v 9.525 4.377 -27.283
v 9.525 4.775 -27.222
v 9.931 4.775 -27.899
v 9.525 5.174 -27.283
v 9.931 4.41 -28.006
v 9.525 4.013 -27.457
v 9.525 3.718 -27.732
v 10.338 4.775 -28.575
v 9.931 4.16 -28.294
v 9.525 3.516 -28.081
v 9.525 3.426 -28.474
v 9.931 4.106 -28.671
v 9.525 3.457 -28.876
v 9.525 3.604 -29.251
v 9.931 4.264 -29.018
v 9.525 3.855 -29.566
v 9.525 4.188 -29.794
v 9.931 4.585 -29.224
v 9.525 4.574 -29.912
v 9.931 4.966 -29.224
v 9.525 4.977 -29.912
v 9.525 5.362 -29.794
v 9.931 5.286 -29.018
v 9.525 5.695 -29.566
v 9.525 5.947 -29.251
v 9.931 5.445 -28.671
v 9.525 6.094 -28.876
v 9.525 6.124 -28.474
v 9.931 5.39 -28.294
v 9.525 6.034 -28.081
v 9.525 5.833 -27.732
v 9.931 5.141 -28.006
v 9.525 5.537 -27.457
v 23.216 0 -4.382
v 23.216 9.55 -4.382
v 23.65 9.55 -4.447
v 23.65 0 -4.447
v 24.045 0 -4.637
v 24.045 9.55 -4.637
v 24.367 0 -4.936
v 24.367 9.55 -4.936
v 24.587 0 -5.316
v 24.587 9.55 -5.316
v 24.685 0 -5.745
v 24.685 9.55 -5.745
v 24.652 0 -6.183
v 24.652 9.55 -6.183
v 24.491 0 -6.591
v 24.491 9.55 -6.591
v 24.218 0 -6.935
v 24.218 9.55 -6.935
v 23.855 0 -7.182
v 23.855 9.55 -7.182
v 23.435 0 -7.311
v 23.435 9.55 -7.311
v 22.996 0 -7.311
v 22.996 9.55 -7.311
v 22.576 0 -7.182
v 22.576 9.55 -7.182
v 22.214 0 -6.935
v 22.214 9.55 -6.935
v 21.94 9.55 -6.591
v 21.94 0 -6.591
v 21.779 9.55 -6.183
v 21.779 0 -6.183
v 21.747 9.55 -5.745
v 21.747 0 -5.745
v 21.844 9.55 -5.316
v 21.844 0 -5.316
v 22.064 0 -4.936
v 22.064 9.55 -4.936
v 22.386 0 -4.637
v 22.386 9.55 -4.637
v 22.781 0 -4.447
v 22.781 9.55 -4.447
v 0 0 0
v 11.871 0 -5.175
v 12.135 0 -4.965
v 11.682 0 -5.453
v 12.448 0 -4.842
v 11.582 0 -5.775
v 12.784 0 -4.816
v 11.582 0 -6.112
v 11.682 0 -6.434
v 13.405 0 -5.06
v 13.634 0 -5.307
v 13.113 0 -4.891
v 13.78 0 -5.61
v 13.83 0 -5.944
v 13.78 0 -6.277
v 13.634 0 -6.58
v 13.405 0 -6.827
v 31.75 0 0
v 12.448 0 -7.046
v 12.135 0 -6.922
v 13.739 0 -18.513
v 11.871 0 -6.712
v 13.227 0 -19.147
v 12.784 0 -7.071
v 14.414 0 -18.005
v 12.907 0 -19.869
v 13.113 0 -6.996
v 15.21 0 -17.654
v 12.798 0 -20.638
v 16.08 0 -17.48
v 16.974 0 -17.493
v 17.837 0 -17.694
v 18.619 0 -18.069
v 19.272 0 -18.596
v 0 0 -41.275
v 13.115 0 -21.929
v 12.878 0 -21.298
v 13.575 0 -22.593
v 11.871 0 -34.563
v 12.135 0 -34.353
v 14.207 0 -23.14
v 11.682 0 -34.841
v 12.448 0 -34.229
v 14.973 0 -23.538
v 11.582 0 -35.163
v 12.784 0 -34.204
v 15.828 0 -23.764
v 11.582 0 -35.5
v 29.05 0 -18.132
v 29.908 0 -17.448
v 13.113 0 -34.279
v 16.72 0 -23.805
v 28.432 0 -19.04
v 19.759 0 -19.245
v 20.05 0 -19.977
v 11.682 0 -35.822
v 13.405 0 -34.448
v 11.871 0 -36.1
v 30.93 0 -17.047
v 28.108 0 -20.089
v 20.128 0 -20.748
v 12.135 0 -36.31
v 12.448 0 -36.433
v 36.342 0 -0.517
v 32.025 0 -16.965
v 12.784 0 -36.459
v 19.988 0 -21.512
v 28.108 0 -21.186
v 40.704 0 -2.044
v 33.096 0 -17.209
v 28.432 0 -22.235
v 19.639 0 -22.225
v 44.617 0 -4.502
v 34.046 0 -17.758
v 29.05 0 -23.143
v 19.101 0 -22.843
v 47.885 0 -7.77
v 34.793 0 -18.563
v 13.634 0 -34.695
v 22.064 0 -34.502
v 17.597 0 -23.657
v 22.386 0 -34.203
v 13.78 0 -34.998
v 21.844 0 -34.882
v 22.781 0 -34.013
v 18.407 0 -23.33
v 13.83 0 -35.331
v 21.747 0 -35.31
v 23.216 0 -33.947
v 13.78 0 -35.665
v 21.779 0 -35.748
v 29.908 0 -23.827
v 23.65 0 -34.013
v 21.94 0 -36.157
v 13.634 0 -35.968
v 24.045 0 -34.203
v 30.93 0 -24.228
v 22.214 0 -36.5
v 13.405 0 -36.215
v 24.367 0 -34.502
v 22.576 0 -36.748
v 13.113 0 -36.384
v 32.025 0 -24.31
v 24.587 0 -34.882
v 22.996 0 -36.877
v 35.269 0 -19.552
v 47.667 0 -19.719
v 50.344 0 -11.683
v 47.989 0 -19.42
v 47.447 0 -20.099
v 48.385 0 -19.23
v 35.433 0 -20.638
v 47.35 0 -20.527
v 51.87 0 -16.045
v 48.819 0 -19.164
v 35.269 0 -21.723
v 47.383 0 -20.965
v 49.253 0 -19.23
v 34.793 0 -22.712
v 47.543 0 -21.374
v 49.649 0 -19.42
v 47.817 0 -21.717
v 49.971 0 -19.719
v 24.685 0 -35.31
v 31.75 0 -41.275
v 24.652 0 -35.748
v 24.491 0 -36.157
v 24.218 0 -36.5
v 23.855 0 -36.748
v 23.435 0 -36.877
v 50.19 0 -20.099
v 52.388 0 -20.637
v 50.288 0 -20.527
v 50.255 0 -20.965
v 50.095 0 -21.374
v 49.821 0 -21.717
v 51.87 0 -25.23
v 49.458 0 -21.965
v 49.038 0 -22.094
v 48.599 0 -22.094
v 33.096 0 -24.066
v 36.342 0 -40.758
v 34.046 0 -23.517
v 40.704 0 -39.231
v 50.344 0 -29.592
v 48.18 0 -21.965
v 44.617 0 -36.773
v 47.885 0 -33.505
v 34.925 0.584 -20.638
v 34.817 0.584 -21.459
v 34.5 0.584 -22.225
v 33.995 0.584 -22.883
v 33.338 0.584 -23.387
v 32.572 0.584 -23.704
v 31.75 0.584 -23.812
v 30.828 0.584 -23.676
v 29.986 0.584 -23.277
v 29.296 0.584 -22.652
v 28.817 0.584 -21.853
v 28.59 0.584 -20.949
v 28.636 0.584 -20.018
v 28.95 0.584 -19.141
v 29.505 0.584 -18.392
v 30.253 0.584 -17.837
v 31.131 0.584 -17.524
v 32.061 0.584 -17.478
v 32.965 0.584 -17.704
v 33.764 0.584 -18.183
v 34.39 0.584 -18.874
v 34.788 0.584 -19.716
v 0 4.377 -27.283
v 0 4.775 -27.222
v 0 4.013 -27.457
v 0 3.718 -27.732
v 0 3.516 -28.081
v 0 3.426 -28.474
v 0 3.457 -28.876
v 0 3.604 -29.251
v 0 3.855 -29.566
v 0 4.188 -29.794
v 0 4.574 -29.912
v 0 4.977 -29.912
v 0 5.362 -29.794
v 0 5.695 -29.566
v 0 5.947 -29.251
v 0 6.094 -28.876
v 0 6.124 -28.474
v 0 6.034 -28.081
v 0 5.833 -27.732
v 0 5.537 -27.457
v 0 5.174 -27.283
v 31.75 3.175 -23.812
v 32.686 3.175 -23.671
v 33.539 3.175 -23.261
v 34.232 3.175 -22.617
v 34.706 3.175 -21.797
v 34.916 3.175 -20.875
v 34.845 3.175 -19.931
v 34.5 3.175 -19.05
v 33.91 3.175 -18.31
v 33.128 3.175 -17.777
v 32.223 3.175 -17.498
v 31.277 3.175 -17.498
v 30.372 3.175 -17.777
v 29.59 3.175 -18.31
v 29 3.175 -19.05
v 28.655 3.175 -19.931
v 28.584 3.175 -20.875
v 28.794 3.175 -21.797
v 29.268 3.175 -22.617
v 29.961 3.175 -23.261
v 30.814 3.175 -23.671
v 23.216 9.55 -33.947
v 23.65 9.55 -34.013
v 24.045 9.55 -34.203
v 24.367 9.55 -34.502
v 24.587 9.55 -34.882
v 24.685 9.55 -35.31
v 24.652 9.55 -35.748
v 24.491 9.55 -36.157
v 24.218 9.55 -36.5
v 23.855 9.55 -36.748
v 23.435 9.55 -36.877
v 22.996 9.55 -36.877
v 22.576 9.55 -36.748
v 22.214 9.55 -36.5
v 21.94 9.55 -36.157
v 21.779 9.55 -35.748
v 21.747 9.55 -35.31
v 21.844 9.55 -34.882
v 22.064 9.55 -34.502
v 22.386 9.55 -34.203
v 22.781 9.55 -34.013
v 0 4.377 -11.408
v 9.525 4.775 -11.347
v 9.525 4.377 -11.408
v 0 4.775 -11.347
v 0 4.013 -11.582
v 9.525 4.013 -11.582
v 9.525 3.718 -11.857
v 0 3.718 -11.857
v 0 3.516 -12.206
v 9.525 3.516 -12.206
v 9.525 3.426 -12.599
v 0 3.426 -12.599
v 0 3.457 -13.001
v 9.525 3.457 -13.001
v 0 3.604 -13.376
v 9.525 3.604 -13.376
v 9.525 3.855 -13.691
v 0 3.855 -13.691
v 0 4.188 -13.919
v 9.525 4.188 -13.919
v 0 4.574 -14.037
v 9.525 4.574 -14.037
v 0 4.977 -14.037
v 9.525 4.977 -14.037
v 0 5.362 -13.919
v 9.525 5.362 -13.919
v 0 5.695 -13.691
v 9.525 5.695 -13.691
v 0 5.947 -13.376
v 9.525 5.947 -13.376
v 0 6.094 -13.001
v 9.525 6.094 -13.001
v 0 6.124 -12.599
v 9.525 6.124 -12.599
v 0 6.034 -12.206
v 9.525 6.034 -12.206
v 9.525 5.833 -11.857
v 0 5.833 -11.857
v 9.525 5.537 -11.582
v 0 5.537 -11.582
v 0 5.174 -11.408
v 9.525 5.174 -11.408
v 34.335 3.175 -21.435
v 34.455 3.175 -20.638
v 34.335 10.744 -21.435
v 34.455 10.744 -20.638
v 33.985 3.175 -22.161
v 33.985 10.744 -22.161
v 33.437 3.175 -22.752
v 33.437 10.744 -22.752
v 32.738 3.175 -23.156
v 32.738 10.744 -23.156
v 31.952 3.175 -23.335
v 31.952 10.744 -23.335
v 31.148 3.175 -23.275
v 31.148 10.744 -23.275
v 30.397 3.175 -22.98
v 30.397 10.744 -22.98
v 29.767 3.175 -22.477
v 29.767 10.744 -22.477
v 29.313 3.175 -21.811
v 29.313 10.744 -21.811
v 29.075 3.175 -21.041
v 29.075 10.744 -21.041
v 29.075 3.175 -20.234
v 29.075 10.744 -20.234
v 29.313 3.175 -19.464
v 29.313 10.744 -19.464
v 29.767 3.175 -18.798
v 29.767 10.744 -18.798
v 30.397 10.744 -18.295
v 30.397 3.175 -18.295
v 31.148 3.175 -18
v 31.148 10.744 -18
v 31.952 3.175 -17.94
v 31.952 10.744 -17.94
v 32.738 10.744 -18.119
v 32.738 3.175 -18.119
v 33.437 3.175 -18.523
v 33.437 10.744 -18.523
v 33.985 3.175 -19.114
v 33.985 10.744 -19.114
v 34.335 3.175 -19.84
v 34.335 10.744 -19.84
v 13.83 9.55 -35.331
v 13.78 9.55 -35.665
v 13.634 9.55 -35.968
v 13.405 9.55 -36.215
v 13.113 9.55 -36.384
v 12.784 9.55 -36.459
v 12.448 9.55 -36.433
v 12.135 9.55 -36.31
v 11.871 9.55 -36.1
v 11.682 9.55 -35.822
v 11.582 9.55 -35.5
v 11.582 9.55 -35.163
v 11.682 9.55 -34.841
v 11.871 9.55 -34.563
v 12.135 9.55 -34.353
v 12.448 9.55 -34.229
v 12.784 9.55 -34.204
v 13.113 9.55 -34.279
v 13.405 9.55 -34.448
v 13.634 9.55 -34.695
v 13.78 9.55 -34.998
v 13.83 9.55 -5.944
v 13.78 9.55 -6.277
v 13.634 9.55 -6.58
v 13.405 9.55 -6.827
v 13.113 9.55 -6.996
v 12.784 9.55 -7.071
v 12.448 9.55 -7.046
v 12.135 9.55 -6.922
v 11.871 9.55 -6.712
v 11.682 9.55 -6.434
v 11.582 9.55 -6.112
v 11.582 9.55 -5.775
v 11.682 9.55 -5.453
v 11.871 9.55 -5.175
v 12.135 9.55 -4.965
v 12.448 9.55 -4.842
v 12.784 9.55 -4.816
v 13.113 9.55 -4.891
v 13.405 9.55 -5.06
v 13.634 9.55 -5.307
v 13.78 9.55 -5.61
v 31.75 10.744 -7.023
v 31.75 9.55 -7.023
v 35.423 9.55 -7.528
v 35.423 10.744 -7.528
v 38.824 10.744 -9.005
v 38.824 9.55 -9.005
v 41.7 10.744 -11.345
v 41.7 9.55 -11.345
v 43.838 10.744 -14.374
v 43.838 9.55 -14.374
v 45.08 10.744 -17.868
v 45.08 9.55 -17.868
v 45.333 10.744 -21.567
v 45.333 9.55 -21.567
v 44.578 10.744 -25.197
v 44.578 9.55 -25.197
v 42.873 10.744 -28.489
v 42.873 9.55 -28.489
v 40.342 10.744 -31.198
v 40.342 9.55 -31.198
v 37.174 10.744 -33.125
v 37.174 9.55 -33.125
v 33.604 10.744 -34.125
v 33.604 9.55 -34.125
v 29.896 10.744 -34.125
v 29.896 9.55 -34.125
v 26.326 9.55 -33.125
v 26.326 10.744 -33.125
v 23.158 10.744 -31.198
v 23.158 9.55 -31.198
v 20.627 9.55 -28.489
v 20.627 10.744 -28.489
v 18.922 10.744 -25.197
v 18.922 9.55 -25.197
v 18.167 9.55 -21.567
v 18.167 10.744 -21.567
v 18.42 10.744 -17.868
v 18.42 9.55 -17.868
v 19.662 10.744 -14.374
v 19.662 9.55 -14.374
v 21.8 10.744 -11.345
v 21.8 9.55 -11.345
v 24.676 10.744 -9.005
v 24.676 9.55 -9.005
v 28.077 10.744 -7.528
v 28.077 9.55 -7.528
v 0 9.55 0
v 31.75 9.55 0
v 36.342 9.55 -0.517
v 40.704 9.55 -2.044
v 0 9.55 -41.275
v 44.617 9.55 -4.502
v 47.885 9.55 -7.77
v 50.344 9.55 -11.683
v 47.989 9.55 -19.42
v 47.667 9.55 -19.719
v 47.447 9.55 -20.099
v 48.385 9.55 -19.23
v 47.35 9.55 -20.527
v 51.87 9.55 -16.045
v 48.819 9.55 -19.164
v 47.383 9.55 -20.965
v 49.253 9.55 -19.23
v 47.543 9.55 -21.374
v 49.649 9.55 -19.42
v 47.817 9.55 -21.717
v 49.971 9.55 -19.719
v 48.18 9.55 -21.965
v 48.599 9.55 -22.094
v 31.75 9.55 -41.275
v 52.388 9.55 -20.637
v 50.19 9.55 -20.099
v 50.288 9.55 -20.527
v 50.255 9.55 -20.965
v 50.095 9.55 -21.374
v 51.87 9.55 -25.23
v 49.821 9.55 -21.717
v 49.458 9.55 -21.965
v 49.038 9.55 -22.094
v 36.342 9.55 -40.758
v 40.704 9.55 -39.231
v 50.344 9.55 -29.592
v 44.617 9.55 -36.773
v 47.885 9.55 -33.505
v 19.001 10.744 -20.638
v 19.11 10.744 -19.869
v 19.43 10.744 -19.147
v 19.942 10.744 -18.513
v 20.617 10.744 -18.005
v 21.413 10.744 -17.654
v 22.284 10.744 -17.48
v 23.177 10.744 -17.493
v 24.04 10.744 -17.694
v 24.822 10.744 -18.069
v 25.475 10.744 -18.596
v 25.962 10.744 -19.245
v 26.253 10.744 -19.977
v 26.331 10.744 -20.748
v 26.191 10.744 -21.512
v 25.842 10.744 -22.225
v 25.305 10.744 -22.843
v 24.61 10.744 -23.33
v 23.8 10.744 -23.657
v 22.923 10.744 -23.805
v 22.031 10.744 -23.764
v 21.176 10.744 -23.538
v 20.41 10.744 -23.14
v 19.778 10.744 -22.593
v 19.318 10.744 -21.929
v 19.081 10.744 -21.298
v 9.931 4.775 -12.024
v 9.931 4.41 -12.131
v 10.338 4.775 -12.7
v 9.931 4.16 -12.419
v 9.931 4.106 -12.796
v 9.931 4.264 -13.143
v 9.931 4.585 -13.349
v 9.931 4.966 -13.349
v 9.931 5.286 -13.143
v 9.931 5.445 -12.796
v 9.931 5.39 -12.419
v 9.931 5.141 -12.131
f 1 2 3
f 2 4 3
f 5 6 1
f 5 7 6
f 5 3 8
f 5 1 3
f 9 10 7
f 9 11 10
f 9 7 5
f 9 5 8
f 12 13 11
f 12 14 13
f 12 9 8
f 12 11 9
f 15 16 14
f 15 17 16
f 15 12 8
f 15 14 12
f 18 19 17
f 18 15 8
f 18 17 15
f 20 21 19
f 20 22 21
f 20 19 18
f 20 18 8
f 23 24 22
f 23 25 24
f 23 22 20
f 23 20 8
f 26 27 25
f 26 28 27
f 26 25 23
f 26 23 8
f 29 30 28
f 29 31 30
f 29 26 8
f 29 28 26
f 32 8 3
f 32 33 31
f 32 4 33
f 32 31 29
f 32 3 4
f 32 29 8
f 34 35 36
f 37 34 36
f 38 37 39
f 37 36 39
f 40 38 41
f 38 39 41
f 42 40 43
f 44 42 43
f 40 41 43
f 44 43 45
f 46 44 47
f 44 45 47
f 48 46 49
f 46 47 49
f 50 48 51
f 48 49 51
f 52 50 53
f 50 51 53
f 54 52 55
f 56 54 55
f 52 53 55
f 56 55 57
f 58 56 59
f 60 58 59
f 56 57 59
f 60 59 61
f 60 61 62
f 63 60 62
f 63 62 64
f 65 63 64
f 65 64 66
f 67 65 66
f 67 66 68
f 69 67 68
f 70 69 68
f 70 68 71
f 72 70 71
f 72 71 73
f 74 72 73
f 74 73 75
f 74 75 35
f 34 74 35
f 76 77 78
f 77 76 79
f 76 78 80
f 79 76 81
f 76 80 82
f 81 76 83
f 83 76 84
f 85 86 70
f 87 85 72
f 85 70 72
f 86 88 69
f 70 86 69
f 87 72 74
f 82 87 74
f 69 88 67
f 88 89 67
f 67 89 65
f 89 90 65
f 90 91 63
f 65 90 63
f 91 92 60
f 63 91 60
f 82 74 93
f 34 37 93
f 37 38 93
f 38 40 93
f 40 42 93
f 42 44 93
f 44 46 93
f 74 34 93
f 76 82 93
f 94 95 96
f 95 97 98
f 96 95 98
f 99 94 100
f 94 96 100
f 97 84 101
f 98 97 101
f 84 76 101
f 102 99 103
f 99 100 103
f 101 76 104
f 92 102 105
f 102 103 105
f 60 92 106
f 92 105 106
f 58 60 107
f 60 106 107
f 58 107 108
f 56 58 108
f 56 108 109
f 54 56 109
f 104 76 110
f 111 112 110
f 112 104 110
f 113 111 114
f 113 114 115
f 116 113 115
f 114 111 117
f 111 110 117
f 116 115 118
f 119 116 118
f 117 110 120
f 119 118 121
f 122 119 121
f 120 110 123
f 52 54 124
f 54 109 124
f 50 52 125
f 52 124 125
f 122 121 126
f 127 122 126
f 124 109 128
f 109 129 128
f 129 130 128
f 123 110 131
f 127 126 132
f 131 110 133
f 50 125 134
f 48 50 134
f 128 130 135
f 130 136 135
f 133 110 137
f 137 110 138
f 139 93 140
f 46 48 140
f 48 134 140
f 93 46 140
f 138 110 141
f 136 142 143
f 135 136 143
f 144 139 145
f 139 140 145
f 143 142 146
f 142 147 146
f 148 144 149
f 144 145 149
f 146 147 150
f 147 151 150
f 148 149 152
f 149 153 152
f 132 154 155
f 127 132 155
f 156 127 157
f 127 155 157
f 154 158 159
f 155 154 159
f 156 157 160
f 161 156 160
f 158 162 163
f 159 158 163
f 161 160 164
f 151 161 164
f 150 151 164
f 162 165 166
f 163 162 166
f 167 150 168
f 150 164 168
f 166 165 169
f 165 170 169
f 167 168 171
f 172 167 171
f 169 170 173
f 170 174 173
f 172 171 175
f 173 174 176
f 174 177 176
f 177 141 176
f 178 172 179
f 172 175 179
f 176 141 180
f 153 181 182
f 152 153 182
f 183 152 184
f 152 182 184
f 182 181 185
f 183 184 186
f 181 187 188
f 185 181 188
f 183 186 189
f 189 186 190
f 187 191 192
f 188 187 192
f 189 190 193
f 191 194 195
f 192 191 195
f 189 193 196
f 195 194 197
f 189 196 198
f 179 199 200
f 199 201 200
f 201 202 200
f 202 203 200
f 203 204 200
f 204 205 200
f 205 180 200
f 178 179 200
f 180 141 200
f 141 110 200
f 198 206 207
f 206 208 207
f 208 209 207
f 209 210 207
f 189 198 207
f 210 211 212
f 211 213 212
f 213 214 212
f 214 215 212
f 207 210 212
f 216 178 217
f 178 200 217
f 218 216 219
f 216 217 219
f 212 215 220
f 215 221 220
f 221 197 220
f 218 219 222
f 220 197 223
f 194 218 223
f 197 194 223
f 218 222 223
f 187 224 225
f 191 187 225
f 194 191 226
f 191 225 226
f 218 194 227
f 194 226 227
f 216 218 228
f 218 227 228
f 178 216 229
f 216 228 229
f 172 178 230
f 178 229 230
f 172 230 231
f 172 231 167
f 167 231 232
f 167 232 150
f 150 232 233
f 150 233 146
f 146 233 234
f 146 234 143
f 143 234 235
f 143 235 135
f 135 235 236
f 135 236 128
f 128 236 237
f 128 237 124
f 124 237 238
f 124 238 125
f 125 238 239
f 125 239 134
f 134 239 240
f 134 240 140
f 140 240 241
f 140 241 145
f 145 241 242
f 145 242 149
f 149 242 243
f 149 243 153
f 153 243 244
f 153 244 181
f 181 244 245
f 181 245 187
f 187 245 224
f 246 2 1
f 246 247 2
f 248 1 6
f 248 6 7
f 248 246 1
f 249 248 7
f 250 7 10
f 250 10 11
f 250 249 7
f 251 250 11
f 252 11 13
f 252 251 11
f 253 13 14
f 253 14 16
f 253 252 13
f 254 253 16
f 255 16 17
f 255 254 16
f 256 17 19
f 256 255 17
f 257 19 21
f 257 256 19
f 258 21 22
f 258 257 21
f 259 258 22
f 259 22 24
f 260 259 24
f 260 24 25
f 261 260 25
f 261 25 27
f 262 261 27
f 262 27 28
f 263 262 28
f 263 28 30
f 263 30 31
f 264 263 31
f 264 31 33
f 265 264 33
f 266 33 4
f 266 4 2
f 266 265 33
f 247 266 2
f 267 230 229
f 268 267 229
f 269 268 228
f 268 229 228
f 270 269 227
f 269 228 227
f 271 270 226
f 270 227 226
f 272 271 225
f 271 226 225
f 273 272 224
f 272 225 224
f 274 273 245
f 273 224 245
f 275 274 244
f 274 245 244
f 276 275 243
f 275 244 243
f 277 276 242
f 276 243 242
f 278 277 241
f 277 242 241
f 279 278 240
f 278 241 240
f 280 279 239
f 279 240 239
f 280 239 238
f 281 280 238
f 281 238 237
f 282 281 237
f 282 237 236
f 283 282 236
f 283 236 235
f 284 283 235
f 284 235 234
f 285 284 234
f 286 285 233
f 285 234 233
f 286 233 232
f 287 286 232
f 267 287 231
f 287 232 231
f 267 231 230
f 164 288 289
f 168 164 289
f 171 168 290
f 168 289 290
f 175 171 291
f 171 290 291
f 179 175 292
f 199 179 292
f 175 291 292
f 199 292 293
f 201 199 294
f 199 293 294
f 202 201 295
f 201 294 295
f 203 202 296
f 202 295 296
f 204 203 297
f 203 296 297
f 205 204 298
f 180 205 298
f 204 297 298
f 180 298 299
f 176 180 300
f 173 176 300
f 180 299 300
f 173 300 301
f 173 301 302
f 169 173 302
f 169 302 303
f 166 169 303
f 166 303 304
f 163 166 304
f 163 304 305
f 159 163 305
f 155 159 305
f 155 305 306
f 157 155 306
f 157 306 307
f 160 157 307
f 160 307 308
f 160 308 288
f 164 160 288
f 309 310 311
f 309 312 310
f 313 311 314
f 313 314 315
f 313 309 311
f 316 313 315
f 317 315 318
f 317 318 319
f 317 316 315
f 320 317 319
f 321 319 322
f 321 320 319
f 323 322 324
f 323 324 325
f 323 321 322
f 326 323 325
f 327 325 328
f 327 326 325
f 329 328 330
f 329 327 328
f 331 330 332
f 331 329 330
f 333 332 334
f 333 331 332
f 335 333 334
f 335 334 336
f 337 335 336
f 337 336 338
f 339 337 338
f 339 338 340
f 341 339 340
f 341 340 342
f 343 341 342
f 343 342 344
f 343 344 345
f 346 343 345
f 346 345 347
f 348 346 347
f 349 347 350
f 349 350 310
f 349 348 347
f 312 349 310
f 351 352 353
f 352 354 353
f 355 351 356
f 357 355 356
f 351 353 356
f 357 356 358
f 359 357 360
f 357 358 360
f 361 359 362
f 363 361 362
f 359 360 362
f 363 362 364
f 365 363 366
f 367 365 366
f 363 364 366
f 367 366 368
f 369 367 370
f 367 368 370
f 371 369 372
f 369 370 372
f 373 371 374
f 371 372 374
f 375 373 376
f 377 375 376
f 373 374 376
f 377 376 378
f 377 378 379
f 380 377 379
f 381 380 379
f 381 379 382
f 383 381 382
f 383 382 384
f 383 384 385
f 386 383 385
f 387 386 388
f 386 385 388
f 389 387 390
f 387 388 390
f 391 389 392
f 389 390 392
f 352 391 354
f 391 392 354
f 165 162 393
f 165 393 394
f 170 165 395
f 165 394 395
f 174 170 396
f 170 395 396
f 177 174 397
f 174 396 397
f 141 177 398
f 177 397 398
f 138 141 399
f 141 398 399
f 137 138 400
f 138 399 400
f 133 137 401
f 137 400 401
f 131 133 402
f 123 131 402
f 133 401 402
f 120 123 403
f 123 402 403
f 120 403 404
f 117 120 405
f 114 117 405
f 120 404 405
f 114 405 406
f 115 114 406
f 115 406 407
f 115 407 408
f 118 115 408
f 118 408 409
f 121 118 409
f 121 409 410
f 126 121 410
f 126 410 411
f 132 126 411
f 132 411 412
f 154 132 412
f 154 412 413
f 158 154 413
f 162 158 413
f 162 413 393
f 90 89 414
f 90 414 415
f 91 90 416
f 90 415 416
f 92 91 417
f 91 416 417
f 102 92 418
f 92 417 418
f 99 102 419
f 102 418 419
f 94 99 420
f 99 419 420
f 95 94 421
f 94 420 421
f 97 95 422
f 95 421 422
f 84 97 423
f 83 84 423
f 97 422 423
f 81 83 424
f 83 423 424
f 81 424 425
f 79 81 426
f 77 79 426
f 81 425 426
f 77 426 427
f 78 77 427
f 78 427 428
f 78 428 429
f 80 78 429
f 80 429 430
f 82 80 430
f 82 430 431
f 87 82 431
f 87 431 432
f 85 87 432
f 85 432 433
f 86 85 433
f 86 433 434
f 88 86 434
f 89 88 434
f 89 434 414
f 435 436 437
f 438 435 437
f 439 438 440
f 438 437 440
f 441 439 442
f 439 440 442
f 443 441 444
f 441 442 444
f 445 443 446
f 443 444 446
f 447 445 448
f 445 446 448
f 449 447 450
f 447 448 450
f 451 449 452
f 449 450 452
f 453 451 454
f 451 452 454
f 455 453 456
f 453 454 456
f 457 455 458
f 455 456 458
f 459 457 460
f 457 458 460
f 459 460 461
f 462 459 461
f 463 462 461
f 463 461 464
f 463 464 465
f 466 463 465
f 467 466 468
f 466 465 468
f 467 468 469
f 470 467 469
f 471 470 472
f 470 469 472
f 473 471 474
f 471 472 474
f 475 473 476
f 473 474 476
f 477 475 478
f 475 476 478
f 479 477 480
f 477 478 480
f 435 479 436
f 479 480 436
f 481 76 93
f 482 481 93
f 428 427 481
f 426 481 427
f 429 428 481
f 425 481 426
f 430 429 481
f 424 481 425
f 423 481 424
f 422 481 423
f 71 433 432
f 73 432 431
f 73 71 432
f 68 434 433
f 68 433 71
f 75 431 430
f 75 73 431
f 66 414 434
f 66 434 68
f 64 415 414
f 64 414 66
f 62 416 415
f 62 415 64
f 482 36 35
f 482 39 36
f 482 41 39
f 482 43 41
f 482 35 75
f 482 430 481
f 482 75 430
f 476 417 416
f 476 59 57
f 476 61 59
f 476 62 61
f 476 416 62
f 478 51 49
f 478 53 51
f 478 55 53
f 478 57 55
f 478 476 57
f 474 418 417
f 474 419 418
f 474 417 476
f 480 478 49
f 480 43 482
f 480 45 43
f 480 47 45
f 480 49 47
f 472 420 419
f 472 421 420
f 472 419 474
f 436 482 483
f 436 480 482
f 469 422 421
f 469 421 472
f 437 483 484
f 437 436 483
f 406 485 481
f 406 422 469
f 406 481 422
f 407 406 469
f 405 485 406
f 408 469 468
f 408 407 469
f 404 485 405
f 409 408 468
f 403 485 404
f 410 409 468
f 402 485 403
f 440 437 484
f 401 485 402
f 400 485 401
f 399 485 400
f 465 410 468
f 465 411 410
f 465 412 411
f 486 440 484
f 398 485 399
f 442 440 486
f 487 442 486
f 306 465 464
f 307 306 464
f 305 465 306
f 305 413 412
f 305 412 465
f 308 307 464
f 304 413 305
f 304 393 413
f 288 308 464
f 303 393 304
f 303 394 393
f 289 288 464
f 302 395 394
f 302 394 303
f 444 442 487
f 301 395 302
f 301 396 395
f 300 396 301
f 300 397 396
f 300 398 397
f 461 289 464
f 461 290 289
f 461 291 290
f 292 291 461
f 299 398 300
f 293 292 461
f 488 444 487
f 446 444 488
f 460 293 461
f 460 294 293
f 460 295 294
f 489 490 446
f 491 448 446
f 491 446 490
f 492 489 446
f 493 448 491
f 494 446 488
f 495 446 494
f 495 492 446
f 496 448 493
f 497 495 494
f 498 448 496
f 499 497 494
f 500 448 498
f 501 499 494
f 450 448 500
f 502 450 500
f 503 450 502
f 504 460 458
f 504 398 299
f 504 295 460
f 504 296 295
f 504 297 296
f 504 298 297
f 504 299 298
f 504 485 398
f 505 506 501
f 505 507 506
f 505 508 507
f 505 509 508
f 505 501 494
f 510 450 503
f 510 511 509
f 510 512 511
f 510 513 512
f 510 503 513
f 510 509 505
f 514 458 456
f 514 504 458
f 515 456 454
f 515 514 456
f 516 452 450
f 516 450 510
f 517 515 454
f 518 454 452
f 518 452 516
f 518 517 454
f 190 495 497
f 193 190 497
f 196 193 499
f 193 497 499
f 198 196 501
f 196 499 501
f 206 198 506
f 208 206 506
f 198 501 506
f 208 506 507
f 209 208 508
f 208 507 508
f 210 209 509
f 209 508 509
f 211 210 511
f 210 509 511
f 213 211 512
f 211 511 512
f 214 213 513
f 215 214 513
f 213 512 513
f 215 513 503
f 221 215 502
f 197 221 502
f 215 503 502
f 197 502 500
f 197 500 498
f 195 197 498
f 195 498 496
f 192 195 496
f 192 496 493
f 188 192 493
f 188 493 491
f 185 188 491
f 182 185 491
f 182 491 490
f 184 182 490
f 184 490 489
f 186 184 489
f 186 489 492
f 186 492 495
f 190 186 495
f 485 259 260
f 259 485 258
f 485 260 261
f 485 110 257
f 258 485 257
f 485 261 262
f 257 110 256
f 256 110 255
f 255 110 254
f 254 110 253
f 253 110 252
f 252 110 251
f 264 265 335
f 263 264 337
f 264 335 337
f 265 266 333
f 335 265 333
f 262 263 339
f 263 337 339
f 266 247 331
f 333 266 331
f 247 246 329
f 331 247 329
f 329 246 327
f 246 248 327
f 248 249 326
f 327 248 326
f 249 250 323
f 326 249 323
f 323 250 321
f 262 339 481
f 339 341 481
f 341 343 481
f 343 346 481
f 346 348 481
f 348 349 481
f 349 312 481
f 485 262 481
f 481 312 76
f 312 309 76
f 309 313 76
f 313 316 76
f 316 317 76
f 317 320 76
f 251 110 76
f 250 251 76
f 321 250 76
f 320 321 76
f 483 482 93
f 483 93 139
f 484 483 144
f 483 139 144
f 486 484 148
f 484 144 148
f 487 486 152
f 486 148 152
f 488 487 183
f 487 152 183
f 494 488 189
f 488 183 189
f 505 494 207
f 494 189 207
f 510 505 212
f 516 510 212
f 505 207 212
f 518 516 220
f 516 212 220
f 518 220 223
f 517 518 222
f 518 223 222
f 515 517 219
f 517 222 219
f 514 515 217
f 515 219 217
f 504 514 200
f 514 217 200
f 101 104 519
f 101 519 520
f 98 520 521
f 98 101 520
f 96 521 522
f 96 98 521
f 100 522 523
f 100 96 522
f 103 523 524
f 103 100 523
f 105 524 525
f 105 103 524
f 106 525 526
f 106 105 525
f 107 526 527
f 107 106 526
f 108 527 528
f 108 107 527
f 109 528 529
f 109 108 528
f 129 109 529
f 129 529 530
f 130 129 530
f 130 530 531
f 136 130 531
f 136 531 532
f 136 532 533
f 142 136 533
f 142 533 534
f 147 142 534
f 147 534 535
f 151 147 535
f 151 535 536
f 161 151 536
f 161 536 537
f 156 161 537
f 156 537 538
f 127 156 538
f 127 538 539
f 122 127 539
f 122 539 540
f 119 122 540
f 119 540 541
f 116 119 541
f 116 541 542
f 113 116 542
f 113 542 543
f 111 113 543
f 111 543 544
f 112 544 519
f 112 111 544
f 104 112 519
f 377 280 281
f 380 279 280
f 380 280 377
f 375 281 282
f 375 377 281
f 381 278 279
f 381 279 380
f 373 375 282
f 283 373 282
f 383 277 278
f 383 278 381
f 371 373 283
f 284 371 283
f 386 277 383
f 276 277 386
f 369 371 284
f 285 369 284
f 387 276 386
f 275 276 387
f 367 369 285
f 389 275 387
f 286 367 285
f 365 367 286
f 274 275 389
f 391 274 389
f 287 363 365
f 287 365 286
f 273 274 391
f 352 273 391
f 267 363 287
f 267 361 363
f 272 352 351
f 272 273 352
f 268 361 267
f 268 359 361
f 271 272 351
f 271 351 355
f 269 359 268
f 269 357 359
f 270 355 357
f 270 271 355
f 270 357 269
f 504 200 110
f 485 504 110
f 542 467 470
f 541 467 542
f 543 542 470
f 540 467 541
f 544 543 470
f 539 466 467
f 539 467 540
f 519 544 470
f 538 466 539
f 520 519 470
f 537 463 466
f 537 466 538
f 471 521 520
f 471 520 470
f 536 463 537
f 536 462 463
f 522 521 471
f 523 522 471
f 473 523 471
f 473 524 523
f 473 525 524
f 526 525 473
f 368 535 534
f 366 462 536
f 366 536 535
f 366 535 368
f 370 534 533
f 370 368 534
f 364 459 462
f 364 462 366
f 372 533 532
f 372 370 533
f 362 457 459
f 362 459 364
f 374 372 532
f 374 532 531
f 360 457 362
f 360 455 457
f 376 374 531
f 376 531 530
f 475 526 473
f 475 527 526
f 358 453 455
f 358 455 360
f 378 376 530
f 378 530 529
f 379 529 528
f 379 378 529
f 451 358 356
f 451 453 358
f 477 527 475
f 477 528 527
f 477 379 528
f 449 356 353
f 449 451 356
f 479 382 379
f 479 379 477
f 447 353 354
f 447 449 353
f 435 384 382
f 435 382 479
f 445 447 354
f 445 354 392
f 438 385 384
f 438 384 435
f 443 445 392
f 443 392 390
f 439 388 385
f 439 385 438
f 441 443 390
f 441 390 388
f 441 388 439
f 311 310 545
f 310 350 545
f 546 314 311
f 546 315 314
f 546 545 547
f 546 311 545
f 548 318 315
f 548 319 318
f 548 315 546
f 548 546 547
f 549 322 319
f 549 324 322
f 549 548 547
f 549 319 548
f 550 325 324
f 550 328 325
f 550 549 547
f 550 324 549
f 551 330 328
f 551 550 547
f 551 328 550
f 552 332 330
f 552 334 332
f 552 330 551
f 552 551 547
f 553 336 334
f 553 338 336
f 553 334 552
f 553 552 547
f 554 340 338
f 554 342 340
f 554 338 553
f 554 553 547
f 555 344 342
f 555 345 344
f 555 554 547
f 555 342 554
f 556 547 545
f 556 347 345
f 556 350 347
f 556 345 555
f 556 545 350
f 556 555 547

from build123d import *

# Parameters (mm, degrees)
BOSS_EXTRUDE1_DEPTH               = 9.5504
SKETCH2_R                         = 13.6144
BOSS_EXTRUDE2_DEPTH               = 1.1938
SKETCH3_R                         = 1.4732
CUT_EXTRUDE1_DEPTH                = 68.553783128
F_4_40_TAPPED_HOLE1_D             = 2.2606
F_1_4_28_TAPPED_HOLE1_D           = 5.4102
F_1_4_28_TAPPED_HOLE1_CSINK_D     = 7.366
F_1_4_28_TAPPED_HOLE1_CSINK_ANGLE = 82
SKETCH11_R                        = 3.175
CUT_EXTRUDE3_DEPTH                = 68.553783128
SKETCH12_R                        = 3.175
CUT_EXTRUDE4_DEPTH                = 3.175
LPATTERN1_COUNT                   = 2
LPATTERN1_PITCH                   = 15.875


with BuildPart() as part:
    # Sketch1 → Boss-Extrude1 (new body)
    with BuildSketch(Plane(origin=(0, 0, 0), x_dir=(1, 0, 0), z_dir=(0, 1, 0))):
        with BuildLine():
            Line((0, 0), (31.75, 0))
            ThreePointArc((31.75, 0), (52.3875, 20.6375), (31.75, 41.275))
            Line((31.75, 41.275), (0, 41.275))
            Line((0, 41.275), (0, 0))
        make_face()
    extrude(amount=BOSS_EXTRUDE1_DEPTH)

    # Sketch2 → Boss-Extrude2 (add)
    with BuildSketch(Plane(origin=(0, 9.5504, 0), x_dir=(1, 0, 0), z_dir=(0, 1, 0))):
        with Locations(Location((31.75, 20.6375, 0), (0, 0, 270))):
            Circle(SKETCH2_R)
    extrude(amount=BOSS_EXTRUDE2_DEPTH)

    # Sketch3 → Cut-Extrude1 (cut, through all)
    with BuildSketch(Plane(origin=(0, 10.7442, 0), x_dir=(1, 0, 0), z_dir=(0, 1, 0))):
        with Locations(Location((23.2156, 35.4203, 0), (0, 0, 270))):
            Circle(SKETCH3_R)
        with Locations(Location((48.8188, 20.6375, 0), (0, 0, 270))):
            Circle(SKETCH3_R)
        with Locations(Location((23.2156, 5.8547, 0), (0, 0, 270))):
            Circle(SKETCH3_R)
    extrude(amount=-CUT_EXTRUDE1_DEPTH, mode=Mode.SUBTRACT)

    # #4-40 Tapped Hole1 (through all)
    with Locations(Plane(origin=(0, 0, 0), x_dir=(-1, 0, 0), z_dir=(0, -1, 0))):
        with Locations((-12.7, 5.9436), (-12.7, 35.3314)):
            Hole(F_4_40_TAPPED_HOLE1_D / 2)

    # 1/4-28 Tapped Hole1 (through all)
    with Locations(Plane(origin=(0, 0, 0), x_dir=(-1, 0, 0), z_dir=(0, -1, 0))):
        with Locations((-31.75, 20.6375)):
            CounterSinkHole(F_1_4_28_TAPPED_HOLE1_D / 2, F_1_4_28_TAPPED_HOLE1_CSINK_D / 2, counter_sink_angle=F_1_4_28_TAPPED_HOLE1_CSINK_ANGLE)

    # Sketch11 → Cut-Extrude3 (cut, through all)
    with BuildSketch(Plane(origin=(0, 0, 0), x_dir=(0, 0, 1), z_dir=(0.499999999999998, 0.8660254037844398, 0))):
        with Locations(Location((-20.6375, 14.25807156, 0), (0, 0, 270))):
            Circle(SKETCH11_R)
    extrude(amount=CUT_EXTRUDE3_DEPTH, mode=Mode.SUBTRACT)

    # Sketch12 → Cut-Extrude4 (cut)
    with BuildSketch(Plane.XZ):
        with Locations(Location((31.75, -20.6375, 0), (0, 0, 270))):
            Circle(SKETCH12_R)
    extrude(amount=-CUT_EXTRUDE4_DEPTH, mode=Mode.SUBTRACT)

    # Sketch15 → #6-32 Tapped Hole1 (revolve, cut)
    with BuildSketch(Plane(origin=(0, 4.7752, -28.575), x_dir=(0, 0, 1), z_dir=(0, 1, 0))):
        Polygon((0, 0), (0, 10.33769403), (1.35255, 9.525), (1.35255, 0), align=None)
    f_6_32_tapped_hole1 = revolve(axis=Axis((-6.35, 4.7752, -28.575), (1, 0, 0)), mode=Mode.SUBTRACT)

    # LPattern1: #6-32 Tapped Hole1 ×2
    with Locations(*[(0, 0, i * LPATTERN1_PITCH) for i in range(1, LPATTERN1_COUNT)]):
        add(f_6_32_tapped_hole1, mode=Mode.SUBTRACT)


solid = part.part
